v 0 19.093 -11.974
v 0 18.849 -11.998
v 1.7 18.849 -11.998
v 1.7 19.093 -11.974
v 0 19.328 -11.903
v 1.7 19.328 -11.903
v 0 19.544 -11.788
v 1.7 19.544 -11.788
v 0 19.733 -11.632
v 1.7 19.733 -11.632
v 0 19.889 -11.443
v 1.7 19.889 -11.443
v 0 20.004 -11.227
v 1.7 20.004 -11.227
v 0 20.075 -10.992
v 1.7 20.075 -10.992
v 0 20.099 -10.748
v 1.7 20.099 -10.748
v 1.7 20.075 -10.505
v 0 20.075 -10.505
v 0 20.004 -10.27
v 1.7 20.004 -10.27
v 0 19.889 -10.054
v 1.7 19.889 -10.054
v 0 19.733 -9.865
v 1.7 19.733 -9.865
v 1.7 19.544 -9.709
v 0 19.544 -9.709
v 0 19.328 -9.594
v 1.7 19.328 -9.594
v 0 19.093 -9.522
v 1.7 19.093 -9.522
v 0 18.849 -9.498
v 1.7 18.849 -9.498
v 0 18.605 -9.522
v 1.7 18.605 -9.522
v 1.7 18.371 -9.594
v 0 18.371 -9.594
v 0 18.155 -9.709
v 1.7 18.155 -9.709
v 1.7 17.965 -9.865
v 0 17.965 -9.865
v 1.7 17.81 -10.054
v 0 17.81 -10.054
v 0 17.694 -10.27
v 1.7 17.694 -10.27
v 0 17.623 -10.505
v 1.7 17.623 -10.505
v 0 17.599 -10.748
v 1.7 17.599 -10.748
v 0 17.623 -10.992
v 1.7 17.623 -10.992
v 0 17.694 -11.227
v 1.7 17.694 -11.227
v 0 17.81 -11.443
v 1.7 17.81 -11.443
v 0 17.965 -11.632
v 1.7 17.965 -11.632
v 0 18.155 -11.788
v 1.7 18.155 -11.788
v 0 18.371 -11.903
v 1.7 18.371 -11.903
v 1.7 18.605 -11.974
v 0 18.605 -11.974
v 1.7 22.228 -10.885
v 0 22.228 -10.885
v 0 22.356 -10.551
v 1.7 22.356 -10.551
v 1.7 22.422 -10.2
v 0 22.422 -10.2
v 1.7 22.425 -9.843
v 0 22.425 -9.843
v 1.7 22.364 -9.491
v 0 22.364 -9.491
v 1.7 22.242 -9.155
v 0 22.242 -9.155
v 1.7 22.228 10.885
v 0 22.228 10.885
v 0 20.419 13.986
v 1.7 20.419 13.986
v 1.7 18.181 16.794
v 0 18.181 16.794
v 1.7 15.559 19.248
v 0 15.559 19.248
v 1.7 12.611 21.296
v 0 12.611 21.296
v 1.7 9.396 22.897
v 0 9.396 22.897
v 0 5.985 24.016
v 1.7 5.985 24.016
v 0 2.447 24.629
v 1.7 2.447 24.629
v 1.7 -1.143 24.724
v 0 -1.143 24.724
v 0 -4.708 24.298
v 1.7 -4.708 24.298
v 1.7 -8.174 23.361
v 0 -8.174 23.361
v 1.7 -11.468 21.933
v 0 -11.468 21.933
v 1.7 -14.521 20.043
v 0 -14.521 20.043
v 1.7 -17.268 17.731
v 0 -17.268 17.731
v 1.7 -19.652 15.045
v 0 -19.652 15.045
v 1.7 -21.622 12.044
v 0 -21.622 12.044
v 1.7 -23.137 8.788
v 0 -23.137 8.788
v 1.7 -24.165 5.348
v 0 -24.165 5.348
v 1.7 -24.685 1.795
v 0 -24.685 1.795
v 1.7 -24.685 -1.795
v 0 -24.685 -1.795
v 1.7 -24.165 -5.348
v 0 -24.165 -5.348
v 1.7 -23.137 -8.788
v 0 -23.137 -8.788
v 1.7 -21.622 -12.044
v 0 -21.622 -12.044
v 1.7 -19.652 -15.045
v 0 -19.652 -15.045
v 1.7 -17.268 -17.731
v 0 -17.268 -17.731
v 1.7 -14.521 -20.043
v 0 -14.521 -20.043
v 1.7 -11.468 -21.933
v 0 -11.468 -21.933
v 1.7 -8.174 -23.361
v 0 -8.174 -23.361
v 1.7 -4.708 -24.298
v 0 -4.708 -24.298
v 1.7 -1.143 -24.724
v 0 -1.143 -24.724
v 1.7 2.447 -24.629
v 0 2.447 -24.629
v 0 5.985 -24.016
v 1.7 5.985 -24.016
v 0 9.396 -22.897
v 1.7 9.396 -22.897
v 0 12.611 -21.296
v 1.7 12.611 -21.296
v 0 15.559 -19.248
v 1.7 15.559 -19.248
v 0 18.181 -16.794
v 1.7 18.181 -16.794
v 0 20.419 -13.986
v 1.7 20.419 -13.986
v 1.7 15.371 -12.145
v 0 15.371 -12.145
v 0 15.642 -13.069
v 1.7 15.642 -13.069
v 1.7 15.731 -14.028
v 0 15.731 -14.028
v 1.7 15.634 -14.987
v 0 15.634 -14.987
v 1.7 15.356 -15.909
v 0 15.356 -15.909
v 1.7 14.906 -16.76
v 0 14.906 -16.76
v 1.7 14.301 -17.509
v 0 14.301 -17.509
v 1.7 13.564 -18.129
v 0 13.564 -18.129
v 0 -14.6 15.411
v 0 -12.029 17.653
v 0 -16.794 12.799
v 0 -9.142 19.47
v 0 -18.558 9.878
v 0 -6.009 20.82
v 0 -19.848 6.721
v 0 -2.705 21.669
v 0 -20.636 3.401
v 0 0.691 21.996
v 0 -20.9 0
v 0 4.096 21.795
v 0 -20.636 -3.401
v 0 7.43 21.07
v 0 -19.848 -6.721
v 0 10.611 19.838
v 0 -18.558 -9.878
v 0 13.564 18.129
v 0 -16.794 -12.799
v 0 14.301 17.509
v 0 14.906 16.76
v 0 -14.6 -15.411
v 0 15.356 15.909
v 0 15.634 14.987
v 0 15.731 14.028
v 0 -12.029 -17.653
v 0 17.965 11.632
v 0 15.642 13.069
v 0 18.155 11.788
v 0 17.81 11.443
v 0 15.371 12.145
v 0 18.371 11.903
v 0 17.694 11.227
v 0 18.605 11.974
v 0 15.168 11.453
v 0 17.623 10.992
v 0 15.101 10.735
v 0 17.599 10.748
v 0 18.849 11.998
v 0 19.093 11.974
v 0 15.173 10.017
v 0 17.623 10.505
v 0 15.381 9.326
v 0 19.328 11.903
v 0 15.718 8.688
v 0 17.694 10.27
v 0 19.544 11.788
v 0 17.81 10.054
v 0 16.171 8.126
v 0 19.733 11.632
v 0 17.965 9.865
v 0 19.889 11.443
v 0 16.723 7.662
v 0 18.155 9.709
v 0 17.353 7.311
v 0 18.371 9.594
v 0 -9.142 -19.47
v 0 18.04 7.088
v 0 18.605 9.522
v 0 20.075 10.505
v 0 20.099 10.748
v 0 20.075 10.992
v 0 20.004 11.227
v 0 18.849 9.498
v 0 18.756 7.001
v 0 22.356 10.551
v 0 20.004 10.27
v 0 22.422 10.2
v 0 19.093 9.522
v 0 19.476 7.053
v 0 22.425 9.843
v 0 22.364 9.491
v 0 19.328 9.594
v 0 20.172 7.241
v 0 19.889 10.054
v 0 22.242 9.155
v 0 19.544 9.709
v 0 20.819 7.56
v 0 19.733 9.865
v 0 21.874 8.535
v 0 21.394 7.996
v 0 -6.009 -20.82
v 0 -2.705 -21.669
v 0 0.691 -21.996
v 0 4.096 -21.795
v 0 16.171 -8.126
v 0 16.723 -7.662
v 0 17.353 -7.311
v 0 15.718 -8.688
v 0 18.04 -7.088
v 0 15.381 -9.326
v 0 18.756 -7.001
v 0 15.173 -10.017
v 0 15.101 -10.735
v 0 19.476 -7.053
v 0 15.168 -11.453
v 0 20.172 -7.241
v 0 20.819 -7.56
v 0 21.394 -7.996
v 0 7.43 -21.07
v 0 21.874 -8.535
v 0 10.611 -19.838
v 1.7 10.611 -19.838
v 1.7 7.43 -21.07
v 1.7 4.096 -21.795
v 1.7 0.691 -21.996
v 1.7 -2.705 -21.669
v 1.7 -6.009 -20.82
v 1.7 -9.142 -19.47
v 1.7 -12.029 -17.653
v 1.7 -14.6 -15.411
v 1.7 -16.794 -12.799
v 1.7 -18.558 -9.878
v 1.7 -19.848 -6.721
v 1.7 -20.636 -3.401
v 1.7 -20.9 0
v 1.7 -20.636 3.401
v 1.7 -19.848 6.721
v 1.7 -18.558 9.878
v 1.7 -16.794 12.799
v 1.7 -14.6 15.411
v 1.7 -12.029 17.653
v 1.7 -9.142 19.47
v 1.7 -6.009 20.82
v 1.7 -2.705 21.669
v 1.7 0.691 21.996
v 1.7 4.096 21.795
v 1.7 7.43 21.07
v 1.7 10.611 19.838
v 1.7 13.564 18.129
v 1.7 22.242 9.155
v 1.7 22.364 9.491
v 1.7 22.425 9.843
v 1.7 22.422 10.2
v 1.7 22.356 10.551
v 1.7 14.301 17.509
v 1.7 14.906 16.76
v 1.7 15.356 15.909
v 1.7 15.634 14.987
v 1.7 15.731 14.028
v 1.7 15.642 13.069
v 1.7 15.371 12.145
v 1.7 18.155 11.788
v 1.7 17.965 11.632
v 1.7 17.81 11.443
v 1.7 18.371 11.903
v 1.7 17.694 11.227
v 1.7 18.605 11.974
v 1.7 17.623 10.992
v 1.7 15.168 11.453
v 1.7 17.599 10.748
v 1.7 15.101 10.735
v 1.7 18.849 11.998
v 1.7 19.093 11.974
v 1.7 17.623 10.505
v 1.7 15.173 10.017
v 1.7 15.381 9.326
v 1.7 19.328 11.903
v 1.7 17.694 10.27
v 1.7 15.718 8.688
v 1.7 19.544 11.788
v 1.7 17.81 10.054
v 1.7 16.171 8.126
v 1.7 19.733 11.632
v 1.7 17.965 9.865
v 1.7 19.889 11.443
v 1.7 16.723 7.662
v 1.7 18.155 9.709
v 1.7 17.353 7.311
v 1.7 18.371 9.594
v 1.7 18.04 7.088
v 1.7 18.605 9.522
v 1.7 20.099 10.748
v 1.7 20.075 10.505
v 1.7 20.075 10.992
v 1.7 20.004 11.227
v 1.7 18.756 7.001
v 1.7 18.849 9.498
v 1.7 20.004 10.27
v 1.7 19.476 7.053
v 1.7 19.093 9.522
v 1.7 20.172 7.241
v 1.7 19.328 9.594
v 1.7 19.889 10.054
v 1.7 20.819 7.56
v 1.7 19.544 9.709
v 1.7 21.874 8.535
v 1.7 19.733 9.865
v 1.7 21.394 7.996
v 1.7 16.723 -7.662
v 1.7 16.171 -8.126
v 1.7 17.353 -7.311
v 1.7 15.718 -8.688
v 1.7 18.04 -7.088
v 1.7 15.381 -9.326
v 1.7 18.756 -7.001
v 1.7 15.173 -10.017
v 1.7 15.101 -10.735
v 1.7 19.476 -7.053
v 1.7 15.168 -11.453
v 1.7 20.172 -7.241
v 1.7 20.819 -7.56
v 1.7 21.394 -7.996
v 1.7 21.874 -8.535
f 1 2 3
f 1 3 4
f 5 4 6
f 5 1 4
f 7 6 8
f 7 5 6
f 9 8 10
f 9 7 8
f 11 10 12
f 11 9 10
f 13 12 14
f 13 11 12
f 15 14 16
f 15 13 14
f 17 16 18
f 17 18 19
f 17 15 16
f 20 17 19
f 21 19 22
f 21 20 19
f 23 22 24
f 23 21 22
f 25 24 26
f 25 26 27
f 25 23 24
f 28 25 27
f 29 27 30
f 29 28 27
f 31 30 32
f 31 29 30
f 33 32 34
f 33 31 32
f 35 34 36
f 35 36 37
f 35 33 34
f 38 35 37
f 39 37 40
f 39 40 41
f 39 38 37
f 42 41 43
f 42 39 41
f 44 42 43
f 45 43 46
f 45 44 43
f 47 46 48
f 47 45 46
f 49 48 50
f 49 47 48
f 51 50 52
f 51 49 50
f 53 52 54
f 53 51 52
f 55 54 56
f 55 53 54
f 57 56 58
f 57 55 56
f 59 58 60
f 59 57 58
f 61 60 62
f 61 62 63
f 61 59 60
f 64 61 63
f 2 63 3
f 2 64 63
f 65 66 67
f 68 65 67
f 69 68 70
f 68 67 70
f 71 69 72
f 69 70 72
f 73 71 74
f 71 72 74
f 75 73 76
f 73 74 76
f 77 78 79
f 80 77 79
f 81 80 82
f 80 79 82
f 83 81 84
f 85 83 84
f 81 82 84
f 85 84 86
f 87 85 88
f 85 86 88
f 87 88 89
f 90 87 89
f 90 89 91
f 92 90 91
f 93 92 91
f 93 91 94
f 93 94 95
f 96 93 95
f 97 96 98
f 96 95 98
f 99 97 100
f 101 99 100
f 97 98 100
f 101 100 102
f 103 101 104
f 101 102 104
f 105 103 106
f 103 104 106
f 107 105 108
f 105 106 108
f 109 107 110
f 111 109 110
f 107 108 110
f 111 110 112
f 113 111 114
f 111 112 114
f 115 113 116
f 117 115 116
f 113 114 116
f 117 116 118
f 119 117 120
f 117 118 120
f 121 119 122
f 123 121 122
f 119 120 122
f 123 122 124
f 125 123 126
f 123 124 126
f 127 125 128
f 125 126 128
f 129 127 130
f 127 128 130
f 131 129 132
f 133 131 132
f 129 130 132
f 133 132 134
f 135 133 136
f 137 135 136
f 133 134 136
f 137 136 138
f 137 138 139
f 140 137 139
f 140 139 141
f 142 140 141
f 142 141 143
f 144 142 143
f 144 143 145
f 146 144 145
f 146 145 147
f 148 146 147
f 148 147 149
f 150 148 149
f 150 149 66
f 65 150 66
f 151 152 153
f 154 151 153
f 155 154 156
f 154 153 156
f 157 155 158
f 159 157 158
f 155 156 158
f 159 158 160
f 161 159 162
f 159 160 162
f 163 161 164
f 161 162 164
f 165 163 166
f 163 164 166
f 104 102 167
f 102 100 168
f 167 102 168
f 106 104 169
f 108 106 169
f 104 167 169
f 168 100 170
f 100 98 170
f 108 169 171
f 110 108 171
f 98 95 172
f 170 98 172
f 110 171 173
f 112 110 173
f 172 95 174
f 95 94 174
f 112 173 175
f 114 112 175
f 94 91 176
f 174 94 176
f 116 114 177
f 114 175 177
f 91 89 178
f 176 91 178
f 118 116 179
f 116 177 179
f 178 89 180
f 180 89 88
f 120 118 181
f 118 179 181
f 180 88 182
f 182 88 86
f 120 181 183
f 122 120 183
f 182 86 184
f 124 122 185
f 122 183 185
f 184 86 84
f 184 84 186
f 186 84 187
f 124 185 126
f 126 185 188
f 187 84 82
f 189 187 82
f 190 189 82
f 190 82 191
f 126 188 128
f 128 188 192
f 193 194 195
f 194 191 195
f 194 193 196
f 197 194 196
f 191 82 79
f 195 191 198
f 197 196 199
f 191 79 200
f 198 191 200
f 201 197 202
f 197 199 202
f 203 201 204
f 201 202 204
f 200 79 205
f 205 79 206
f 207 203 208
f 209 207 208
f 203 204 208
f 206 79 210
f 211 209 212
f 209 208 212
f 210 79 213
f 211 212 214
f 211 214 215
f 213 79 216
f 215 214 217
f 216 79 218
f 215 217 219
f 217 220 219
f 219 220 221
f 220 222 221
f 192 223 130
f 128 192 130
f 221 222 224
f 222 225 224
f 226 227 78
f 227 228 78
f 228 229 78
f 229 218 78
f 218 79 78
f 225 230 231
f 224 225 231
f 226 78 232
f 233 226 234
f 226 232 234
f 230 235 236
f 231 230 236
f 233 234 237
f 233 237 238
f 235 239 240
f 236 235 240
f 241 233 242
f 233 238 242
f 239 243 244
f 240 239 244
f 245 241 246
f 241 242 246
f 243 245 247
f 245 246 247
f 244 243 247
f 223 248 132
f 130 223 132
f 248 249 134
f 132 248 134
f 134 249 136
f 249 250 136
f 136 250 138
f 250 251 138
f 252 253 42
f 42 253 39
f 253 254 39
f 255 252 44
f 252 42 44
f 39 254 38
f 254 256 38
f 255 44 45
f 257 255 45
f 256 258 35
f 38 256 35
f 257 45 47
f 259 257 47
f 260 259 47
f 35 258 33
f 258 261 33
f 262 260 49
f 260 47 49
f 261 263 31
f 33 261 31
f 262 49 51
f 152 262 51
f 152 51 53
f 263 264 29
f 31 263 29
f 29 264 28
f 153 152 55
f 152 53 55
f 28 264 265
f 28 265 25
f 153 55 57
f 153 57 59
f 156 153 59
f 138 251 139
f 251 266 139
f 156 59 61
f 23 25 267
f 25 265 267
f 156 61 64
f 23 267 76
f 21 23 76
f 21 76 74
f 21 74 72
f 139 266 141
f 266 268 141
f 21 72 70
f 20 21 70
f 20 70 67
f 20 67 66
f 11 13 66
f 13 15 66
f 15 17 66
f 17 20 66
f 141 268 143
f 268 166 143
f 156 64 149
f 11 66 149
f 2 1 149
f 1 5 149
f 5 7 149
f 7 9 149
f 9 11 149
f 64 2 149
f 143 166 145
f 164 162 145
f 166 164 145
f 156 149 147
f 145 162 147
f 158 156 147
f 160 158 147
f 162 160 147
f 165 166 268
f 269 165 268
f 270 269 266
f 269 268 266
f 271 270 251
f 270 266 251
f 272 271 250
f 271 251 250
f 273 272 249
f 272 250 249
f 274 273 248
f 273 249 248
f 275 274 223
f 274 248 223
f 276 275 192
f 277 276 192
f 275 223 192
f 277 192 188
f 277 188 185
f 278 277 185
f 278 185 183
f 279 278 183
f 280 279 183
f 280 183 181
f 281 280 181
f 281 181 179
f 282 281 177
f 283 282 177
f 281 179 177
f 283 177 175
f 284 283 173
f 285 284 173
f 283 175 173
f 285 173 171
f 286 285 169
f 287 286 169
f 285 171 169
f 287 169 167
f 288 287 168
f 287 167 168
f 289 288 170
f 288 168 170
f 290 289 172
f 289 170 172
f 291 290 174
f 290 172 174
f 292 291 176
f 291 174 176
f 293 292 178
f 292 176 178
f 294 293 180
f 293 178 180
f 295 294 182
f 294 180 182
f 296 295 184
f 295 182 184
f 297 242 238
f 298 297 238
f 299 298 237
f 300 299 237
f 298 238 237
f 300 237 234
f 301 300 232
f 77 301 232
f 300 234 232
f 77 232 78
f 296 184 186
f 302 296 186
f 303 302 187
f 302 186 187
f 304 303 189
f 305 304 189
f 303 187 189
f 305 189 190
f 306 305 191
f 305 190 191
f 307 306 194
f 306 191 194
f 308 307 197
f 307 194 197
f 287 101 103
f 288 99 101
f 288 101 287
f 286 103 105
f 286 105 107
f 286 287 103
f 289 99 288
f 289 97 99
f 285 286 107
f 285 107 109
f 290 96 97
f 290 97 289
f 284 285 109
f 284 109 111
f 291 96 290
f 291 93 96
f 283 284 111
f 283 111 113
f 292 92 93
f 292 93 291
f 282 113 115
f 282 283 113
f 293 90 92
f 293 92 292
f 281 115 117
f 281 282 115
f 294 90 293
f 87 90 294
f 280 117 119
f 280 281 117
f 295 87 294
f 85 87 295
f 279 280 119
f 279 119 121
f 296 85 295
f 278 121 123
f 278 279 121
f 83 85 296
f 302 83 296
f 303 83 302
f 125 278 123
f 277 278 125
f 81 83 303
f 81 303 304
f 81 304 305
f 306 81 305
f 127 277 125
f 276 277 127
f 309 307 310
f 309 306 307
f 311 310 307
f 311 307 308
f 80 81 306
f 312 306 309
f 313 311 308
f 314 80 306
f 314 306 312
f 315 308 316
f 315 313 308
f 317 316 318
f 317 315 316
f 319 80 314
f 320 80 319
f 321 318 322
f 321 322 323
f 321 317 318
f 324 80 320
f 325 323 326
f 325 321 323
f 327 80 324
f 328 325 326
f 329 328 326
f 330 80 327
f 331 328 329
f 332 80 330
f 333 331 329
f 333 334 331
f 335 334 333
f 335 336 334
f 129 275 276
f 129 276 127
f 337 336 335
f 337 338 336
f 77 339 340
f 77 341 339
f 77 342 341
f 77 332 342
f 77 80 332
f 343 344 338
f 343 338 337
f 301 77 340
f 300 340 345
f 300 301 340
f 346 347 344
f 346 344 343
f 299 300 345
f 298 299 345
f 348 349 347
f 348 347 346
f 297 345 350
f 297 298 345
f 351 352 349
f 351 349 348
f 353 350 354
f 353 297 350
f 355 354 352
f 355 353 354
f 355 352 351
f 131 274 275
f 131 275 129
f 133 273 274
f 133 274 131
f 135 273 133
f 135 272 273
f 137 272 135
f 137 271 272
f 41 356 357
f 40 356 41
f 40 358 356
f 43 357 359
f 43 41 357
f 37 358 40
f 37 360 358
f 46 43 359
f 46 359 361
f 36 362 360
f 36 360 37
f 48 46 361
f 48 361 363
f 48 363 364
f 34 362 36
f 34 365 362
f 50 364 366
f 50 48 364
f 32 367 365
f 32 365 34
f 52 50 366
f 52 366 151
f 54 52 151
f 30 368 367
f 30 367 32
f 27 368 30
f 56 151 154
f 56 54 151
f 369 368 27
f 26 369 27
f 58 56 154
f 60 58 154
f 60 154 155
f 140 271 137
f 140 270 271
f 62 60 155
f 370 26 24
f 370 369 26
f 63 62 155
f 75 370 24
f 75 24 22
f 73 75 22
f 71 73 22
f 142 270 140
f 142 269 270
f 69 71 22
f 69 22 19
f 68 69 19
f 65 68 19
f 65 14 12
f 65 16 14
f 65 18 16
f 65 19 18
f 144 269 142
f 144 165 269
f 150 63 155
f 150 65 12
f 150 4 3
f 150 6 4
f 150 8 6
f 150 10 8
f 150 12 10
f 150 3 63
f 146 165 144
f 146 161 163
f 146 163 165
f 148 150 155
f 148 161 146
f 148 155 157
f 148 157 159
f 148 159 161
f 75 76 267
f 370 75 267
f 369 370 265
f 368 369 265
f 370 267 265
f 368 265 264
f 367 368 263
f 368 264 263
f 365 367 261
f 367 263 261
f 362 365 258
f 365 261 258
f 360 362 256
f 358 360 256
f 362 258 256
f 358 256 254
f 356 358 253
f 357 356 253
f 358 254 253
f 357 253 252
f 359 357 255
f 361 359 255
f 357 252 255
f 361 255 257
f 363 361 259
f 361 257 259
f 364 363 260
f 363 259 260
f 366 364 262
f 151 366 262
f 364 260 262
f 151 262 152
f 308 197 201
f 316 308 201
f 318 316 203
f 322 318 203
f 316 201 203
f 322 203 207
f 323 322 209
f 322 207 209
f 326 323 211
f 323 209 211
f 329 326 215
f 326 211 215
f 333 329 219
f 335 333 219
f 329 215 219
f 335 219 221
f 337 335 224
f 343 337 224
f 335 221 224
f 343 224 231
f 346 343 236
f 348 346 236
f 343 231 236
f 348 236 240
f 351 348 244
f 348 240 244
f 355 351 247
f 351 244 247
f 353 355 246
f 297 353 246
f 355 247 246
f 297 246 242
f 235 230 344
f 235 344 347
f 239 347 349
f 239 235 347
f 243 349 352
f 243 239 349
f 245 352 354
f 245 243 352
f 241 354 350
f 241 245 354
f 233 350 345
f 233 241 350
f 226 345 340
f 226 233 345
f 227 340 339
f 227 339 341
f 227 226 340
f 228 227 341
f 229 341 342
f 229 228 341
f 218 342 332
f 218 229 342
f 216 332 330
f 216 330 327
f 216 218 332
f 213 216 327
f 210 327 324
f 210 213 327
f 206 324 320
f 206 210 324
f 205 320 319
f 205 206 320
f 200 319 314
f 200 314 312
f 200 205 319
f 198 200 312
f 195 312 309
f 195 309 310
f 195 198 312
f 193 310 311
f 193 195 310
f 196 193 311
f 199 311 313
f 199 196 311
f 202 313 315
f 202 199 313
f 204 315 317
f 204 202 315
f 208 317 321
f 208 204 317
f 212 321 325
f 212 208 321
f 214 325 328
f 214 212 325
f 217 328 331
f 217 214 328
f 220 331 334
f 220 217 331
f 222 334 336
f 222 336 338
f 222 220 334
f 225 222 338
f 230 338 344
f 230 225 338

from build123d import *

# Parameters (mm, degrees)
SKETCH_1_R      = 1.25
EXTRUDE_1_DEPTH = 1.7


with BuildPart() as part:
    # Эскиз1 → Бобышка-Вытянуть1 (new body)
    with BuildSketch(Plane(origin=(0, 0, 0), x_dir=(0, 0, -1), z_dir=(1, 0, 0))):
        with BuildLine():
            ThreePointArc((-10.884792801, 22.227995539), (0, -24.75), (10.884792801, 22.227995539))
            ThreePointArc((10.884792801, 22.227995539), (10.021540765, 22.431727234), (9.155077538, 22.242116696))
            ThreePointArc((9.155077538, 22.242116696), (7.311355918, 17.353467341), (12.145333072, 15.370825971))
            ThreePointArc((12.145333072, 15.370825971), (15.454308904, 15.51747296), (18.128902676, 13.563662694))
            ThreePointArc((18.128902676, 13.563662694), (0, -20.9), (-18.128902676, 13.563662694))
            ThreePointArc((-18.128902676, 13.563662694), (-15.454308904, 15.51747296), (-12.145333072, 15.370825971))
            ThreePointArc((-12.145333072, 15.370825971), (-7.311355918, 17.353467341), (-9.155077538, 22.242116696))
            ThreePointArc((-9.155077538, 22.242116696), (-10.021540765, 22.431727234), (-10.884792801, 22.227995539))
        make_face()
        with Locations((10.748404378, 18.84920571)):
            Circle(SKETCH_1_R, mode=Mode.SUBTRACT)
        with Locations((-10.748404378, 18.84920571)):
            Circle(SKETCH_1_R, mode=Mode.SUBTRACT)
    extrude(amount=EXTRUDE_1_DEPTH)


solid = part.part
